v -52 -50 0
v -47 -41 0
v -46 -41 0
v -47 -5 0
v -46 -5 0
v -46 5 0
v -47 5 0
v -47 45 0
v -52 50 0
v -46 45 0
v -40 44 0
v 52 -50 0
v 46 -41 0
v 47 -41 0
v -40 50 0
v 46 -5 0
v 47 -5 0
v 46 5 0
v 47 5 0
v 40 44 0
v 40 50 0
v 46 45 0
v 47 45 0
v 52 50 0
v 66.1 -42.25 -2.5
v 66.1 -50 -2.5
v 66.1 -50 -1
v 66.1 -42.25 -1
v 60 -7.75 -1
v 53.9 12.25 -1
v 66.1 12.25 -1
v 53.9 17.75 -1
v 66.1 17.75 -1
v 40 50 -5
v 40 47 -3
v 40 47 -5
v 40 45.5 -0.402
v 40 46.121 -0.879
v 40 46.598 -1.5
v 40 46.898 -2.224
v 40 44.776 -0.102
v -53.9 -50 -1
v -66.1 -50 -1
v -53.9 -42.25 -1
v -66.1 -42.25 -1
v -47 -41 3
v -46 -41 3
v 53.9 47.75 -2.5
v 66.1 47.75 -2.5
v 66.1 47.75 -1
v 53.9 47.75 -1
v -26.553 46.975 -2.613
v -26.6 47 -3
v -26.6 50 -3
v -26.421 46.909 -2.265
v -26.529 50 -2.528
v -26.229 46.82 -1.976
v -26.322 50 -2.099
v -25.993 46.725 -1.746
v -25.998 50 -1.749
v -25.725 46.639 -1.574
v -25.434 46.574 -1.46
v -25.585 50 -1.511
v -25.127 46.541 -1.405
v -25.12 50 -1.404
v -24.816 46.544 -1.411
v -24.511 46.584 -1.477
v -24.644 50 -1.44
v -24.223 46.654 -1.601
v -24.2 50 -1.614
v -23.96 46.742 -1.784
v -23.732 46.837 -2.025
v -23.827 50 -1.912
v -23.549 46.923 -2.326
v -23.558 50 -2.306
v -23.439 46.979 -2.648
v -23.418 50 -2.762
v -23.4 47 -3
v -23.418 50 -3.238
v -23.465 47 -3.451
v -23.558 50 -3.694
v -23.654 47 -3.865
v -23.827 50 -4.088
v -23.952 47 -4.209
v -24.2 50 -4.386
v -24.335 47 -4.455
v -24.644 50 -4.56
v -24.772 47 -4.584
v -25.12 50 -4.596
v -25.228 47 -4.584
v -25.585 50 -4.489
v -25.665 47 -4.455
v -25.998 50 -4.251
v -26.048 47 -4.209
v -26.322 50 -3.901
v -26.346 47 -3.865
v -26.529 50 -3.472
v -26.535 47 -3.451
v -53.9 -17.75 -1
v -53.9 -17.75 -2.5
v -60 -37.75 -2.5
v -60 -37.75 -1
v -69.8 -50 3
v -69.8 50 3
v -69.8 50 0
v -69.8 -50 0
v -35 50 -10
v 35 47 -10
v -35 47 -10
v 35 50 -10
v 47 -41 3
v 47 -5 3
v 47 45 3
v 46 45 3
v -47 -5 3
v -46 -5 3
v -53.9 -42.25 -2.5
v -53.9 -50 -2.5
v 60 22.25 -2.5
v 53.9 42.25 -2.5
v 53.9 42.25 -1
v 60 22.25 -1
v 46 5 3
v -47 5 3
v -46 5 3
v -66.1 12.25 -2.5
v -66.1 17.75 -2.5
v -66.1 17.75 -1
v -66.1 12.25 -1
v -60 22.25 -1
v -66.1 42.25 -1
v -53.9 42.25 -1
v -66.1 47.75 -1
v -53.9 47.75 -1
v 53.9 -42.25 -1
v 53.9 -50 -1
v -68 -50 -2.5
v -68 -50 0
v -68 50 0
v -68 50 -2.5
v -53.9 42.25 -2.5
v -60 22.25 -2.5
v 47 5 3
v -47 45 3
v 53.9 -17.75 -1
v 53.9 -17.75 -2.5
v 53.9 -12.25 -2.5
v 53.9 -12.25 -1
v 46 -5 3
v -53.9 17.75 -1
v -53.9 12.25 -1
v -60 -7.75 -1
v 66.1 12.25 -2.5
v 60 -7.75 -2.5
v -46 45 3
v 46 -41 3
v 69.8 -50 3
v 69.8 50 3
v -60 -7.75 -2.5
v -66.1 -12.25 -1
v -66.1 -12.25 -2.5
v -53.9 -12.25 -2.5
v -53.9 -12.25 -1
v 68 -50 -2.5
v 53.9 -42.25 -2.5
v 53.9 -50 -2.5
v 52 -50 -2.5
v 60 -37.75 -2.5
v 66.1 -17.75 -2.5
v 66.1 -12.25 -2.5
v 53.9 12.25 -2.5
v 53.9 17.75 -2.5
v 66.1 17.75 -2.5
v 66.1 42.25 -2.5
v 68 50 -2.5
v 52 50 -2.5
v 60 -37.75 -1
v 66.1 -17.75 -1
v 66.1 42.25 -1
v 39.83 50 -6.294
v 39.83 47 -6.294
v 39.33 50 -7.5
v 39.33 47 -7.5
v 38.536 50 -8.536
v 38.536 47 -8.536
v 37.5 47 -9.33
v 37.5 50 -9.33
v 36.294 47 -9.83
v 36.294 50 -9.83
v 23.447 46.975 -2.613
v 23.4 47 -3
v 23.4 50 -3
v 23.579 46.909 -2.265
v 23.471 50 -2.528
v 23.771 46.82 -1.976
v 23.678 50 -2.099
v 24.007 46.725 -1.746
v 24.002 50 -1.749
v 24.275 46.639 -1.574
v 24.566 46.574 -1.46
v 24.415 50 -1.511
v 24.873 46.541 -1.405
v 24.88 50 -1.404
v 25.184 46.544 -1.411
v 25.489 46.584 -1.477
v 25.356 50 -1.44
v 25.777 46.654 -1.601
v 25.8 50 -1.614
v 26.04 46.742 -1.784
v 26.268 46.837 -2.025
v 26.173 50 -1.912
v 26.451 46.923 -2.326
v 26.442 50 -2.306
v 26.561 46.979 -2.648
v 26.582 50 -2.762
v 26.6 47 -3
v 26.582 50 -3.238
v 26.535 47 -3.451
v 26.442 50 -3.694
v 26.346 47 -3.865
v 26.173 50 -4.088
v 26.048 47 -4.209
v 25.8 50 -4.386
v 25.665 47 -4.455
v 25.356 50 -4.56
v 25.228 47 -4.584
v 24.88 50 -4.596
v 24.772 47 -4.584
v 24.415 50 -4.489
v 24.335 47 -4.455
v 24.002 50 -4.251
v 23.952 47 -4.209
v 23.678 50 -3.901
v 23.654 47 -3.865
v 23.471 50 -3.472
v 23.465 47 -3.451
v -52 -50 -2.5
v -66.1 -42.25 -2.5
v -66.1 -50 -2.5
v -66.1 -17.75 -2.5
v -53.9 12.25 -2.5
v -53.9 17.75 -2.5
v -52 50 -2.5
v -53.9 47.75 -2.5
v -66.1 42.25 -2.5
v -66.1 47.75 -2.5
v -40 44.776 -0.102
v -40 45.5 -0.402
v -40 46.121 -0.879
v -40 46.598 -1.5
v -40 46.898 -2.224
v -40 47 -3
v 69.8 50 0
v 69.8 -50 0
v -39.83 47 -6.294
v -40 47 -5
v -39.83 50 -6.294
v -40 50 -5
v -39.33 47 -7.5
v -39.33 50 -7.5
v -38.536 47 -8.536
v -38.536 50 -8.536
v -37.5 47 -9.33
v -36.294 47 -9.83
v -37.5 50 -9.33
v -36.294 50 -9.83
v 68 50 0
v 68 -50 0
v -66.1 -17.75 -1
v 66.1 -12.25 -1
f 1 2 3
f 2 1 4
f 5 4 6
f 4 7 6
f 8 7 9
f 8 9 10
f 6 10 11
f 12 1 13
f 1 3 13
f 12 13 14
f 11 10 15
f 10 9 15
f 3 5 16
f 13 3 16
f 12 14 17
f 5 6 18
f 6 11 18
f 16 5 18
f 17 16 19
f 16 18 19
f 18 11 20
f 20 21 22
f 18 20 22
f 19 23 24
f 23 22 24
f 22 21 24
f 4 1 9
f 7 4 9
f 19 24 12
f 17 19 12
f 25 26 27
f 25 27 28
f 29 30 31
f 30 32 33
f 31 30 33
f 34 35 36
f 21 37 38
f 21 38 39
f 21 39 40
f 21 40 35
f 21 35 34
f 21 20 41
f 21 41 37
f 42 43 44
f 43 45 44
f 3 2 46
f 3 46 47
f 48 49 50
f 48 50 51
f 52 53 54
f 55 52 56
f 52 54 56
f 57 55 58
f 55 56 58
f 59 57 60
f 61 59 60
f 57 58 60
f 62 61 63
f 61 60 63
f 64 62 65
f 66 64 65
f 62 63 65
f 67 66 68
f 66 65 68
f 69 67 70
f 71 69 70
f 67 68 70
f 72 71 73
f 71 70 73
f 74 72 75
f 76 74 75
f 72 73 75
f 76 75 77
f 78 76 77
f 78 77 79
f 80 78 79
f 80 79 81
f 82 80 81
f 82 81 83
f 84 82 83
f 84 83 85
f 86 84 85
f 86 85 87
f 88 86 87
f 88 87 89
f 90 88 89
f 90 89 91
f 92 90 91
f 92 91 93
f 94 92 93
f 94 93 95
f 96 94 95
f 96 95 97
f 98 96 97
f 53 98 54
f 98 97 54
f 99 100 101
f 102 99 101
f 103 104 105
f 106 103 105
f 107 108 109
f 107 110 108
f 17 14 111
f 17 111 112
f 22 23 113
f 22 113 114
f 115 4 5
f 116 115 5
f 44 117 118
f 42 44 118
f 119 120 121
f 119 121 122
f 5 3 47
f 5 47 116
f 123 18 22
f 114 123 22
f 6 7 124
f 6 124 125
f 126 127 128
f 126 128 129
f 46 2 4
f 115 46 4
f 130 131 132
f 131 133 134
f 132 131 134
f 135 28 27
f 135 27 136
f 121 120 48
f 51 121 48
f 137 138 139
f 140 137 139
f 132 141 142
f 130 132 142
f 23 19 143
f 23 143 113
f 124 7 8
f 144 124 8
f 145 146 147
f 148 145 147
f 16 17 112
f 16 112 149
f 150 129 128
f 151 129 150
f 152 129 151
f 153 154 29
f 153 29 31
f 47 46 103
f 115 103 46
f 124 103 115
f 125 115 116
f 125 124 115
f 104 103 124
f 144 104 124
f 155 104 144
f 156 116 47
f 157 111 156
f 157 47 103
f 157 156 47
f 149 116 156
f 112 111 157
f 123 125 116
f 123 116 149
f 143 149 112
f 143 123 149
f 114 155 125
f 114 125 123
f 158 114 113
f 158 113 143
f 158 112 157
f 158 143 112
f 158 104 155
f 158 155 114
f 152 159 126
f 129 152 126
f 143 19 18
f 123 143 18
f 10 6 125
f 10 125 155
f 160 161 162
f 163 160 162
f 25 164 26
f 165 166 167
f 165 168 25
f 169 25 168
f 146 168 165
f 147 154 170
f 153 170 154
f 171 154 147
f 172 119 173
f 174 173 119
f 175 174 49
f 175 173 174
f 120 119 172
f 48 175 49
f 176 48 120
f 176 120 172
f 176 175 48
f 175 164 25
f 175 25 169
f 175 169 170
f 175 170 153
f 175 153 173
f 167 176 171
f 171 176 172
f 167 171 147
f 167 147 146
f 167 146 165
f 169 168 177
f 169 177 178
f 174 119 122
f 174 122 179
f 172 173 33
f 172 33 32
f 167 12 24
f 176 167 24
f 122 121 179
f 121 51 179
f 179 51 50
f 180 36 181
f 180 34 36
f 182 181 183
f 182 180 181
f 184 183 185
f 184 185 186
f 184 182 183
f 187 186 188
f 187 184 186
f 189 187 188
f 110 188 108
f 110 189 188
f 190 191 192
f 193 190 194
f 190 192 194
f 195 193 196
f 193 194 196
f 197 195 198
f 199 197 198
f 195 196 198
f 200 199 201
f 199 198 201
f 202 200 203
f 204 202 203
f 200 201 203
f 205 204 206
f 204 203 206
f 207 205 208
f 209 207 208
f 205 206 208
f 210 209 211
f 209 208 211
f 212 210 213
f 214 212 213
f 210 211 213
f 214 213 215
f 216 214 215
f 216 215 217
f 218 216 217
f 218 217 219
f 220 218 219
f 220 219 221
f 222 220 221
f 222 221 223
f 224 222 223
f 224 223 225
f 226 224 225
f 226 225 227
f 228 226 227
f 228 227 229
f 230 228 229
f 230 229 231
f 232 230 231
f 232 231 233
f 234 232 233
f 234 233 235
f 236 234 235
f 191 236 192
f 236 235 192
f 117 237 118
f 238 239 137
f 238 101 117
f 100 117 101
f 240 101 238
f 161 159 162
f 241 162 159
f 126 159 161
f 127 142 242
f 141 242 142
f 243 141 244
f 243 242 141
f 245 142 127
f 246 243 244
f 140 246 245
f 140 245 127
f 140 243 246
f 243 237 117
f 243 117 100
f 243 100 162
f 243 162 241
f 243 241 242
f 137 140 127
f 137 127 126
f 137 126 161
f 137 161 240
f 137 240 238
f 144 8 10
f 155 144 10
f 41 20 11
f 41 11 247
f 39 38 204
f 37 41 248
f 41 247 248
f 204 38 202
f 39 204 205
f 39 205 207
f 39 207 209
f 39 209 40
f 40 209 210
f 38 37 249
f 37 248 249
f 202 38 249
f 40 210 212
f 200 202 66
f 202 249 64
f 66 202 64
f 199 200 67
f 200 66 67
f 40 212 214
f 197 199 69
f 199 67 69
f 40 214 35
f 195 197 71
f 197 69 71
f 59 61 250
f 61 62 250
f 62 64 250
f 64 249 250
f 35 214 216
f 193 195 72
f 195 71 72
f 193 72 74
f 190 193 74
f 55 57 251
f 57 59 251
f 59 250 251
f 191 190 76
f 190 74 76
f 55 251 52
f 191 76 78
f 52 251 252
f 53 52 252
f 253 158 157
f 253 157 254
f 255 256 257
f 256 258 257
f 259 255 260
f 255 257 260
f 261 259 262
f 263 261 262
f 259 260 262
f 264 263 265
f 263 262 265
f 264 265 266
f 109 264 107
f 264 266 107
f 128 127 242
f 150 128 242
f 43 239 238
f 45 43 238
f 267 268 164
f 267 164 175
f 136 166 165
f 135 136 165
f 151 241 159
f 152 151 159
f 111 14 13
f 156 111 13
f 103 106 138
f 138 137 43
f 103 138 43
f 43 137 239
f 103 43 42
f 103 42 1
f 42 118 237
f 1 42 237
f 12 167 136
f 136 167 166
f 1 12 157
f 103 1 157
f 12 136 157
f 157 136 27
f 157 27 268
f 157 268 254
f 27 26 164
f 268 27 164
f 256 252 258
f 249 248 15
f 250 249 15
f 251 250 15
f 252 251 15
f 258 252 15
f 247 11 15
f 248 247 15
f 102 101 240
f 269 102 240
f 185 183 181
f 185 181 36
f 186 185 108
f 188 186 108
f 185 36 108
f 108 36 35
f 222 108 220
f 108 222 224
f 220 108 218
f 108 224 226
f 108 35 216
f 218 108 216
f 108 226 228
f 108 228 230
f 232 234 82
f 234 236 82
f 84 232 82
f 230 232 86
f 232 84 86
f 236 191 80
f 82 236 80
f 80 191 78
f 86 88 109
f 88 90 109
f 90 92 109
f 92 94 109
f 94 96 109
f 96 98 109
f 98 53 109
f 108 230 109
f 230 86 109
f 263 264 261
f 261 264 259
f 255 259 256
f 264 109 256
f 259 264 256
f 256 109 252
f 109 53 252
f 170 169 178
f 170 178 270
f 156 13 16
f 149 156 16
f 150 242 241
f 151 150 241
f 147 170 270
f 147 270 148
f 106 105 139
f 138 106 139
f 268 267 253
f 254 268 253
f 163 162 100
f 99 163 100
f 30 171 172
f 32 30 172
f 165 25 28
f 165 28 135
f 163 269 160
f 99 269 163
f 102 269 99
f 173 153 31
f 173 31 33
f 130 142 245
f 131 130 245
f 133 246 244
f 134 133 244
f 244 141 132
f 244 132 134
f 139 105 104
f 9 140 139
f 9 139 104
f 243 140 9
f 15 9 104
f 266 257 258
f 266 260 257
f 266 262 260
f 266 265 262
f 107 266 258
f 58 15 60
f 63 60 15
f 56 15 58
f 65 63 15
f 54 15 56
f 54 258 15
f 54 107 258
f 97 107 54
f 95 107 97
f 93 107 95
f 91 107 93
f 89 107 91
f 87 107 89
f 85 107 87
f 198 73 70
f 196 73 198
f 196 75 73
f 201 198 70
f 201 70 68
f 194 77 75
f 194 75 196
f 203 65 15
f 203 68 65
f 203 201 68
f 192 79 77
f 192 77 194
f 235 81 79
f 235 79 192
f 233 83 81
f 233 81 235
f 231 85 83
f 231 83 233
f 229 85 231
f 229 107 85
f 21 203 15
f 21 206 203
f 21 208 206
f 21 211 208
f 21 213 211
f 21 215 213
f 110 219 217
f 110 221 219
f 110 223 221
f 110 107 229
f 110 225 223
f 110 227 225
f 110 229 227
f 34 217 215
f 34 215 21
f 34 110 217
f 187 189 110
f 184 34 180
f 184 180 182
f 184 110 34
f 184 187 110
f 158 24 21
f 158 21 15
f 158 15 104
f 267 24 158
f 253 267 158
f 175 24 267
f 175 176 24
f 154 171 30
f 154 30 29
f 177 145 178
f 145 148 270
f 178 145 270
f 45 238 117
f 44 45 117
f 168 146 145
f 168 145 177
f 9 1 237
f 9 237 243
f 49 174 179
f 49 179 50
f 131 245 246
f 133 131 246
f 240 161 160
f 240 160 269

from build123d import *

# Parameters (mm, degrees)
SKETCH1_W                 = 140
SKETCH1_H                 = 100
BOSS_EXTRUDE1_DEPTH       = 3
SKETCH3_W                 = 16
SKETCH3_H                 = 100
BOSS_EXTRUDE2_DEPTH       = 2.5
SKETCH4_W                 = 12.2
SKETCH4_H                 = 5.5
CUT_EXTRUDE1_DEPTH        = 1.5
LPATTERN1_COUNT           = 4
LPATTERN1_PITCH           = 30
LPATTERN1_COPY_1_SKETCH_W = 12.2
LPATTERN1_COPY_1_SKETCH_H = 5.5
LPATTERN1_COPY_1_DEPTH    = 1.5
LPATTERN1_COPY_2_SKETCH_W = 12.2
LPATTERN1_COPY_2_SKETCH_H = 5.5
LPATTERN1_COPY_2_DEPTH    = 1.5
LPATTERN1_COPY_3_SKETCH_W = 12.2
LPATTERN1_COPY_3_SKETCH_H = 5.5
LPATTERN1_COPY_3_DEPTH    = 1.5
CUT_EXTRUDE3_DEPTH        = 123.102416029
CUT_EXTRUDE3_DEPTH_BACK   = 123.102416029
SKETCH6_W                 = 0.2
SKETCH6_H                 = 3
CUT_EXTRUDE5_DEPTH        = 1.5
LPATTERN2_COUNT           = 2
LPATTERN2_PITCH           = 30
LPATTERN2_COL_COUNT       = 2
LPATTERN2_COL_PITCH       = 30
MIRROR4_COPY_1_DEPTH      = 1.5
MIRROR4_COPY_2_DEPTH      = 1.5
SKETCH13_W                = 1
SKETCH13_H                = 40
SKETCH13_H_2              = 36
CUT_EXTRUDE7_DEPTH        = 10
SKETCH15_W                = 80
SKETCH15_H                = 3
BOSS_EXTRUDE4_DEPTH       = 10
FILLET2_R                 = 5
FILLET3_R                 = 3
SKETCH17_W                = 12.2
SKETCH17_H                = 2.25
CUT_EXTRUDE9_DEPTH        = 1.5
SKETCH18_R                = 1.6
CUT_EXTRUDE10_DEPTH       = 10


with BuildPart() as part:
    # Sketch1 → Boss-Extrude1 (new body)
    with BuildSketch(Plane.XY):
        Rectangle(SKETCH1_W, SKETCH1_H)
    extrude(amount=BOSS_EXTRUDE1_DEPTH)

    # Sketch3 → Boss-Extrude2 (add)
    with BuildSketch(Plane(origin=(0, 0, 0), x_dir=(-1, 0, 0), z_dir=(0, 0, -1))):
        with Locations((-60, 0)):
            Rectangle(SKETCH3_W, SKETCH3_H)
        with Locations((60, 0)):
            Rectangle(SKETCH3_W, SKETCH3_H)
    extrude(amount=BOSS_EXTRUDE2_DEPTH)

    # Sketch4 → Cut-Extrude1 (cut)
    with BuildSketch(Plane(origin=(0, 0, -2.5), x_dir=(-1, 0, 0), z_dir=(0, 0, -1))):
        with Locations((-60, 45)):
            Rectangle(SKETCH4_W, SKETCH4_H)
    cut_extrude1 = extrude(amount=-CUT_EXTRUDE1_DEPTH, mode=Mode.SUBTRACT)

    # Mirror1: Cut-Extrude1 across plane
    add(cut_extrude1.mirror(Plane(origin=(0, 0, 0), x_dir=(0, 0, 1), z_dir=(1, 0, 0))), mode=Mode.SUBTRACT)

    # LPattern1: Cut-Extrude1 ×4
    with Locations(*[(0, -i * LPATTERN1_PITCH, 0) for i in range(1, LPATTERN1_COUNT)]):
        add(cut_extrude1, mode=Mode.SUBTRACT)

    # LPattern1 copy 1 sketch → LPattern1 copy 1 (cut)
    with BuildSketch(Plane(origin=(0, -30, -2.5), x_dir=(1, 0, 0), z_dir=(0, 0, -1))):
        with Locations((-60, -45)):
            Rectangle(LPATTERN1_COPY_1_SKETCH_W, LPATTERN1_COPY_1_SKETCH_H)
    extrude(amount=-LPATTERN1_COPY_1_DEPTH, mode=Mode.SUBTRACT)

    # LPattern1 copy 2 sketch → LPattern1 copy 2 (cut)
    with BuildSketch(Plane(origin=(0, -60, -2.5), x_dir=(1, 0, 0), z_dir=(0, 0, -1))):
        with Locations((-60, -45)):
            Rectangle(LPATTERN1_COPY_2_SKETCH_W, LPATTERN1_COPY_2_SKETCH_H)
    extrude(amount=-LPATTERN1_COPY_2_DEPTH, mode=Mode.SUBTRACT)

    # LPattern1 copy 3 sketch → LPattern1 copy 3 (cut)
    with BuildSketch(Plane(origin=(0, -90, -2.5), x_dir=(1, 0, 0), z_dir=(0, 0, -1))):
        with Locations((-60, -45)):
            Rectangle(LPATTERN1_COPY_3_SKETCH_W, LPATTERN1_COPY_3_SKETCH_H)
    extrude(amount=-LPATTERN1_COPY_3_DEPTH, mode=Mode.SUBTRACT)

    # Sketch6 → Cut-Extrude3 (cut, two sides: drawn at the far end of the back side and taken through both)
    with BuildSketch(Plane(origin=(0, 50, 0), x_dir=(1, 0, 0), z_dir=(0, 1, 0)).offset(-CUT_EXTRUDE3_DEPTH_BACK)):
        with Locations((-69.9, -1.5)):
            Rectangle(SKETCH6_W, SKETCH6_H)
        with Locations((69.9, -1.5)):
            Rectangle(SKETCH6_W, SKETCH6_H)
    extrude(amount=CUT_EXTRUDE3_DEPTH + CUT_EXTRUDE3_DEPTH_BACK, mode=Mode.SUBTRACT)

    # Sketch11 → Cut-Extrude5 (cut)
    with BuildSketch(Plane(origin=(0, 0, -2.5), x_dir=(-1, 0, 0), z_dir=(0, 0, -1))):
        Polygon((-53.9, 12.25), (-60, -7.75), (-66.1, 12.25), align=None)
    cut_extrude5 = extrude(amount=-CUT_EXTRUDE5_DEPTH, mode=Mode.SUBTRACT)

    # LPattern2: Cut-Extrude5 ×2
    with Locations(*[(0, i * LPATTERN2_PITCH, 0) for i in range(1, LPATTERN2_COUNT)]):
        add(cut_extrude5, mode=Mode.SUBTRACT)

    # LPattern2 col: Cut-Extrude5 ×2
    with Locations(*[(0, -i * LPATTERN2_COL_PITCH, 0) for i in range(1, LPATTERN2_COL_COUNT)]):
        add(cut_extrude5, mode=Mode.SUBTRACT)

    # Mirror4: Cut-Extrude5 across plane
    add(cut_extrude5.mirror(Plane(origin=(0, 0, 0), x_dir=(0, 0, 1), z_dir=(1, 0, 0))), mode=Mode.SUBTRACT)

    # Mirror4 copy 1 sketch → Mirror4 copy 1 (cut)
    with BuildSketch(Plane(origin=(0, 30, -2.5), x_dir=(1, 0, 0), z_dir=(0, 0, -1))):
        Polygon((-53.9, -12.25), (-60, 7.75), (-66.1, -12.25), align=None)
    extrude(amount=-MIRROR4_COPY_1_DEPTH, mode=Mode.SUBTRACT)

    # Mirror4 copy 2 sketch → Mirror4 copy 2 (cut)
    with BuildSketch(Plane(origin=(0, -30, -2.5), x_dir=(1, 0, 0), z_dir=(0, 0, -1))):
        Polygon((-53.9, -12.25), (-60, 7.75), (-66.1, -12.25), align=None)
    extrude(amount=-MIRROR4_COPY_2_DEPTH, mode=Mode.SUBTRACT)

    # Sketch13 → Cut-Extrude7 (cut)
    with BuildSketch(Plane(origin=(0, 0, 0), x_dir=(-1, 0, 0), z_dir=(0, 0, -1))):
        with Locations((-46.5, 25)):
            Rectangle(SKETCH13_W, SKETCH13_H)
        with Locations((-46.5, -23)):
            Rectangle(SKETCH13_W, SKETCH13_H_2)
    cut_extrude7 = extrude(amount=-CUT_EXTRUDE7_DEPTH, mode=Mode.SUBTRACT)

    # Mirror7: Cut-Extrude7 across plane
    add(cut_extrude7.mirror(Plane(origin=(0, 0, 0), x_dir=(0, 0, 1), z_dir=(1, 0, 0))), mode=Mode.SUBTRACT)

    # Sketch15 → Boss-Extrude4 (add)
    with BuildSketch(Plane(origin=(0, 0, 0), x_dir=(-1, 0, 0), z_dir=(0, 0, -1))):
        with Locations((0, 48.5)):
            Rectangle(SKETCH15_W, SKETCH15_H)
    extrude(amount=BOSS_EXTRUDE4_DEPTH)

    # Fillet2
    fillet2_edges = [part.edges().sort_by_distance(p)[0] for p in [
        (40, 48.5, -10),
        (-40, 48.5, -10),
    ]]
    fillet(fillet2_edges, radius=FILLET2_R)

    # Fillet3
    fillet3_edges = [part.edges().sort_by_distance(p)[0] for p in [
        (0, 47, 0),
    ]]
    fillet(fillet3_edges, radius=FILLET3_R)

    # Sketch17 → Cut-Extrude9 (cut)
    with BuildSketch(Plane(origin=(0, 0, -2.5), x_dir=(-1, 0, 0), z_dir=(0, 0, -1))):
        with Locations((-60, -48.875)):
            Rectangle(SKETCH17_W, SKETCH17_H)
    cut_extrude9 = extrude(amount=-CUT_EXTRUDE9_DEPTH, mode=Mode.SUBTRACT)

    # Mirror8: Cut-Extrude9 across plane
    add(cut_extrude9.mirror(Plane(origin=(0, 0, 0), x_dir=(0, 0, 1), z_dir=(1, 0, 0))), mode=Mode.SUBTRACT)

    # Sketch18 → Cut-Extrude10 (cut)
    with BuildSketch(Plane(origin=(0, 50, 0), x_dir=(1, 0, 0), z_dir=(0, 1, 0))):
        with Locations(Location((-25, 3, 0), (0, 0, 180))):
            Circle(SKETCH18_R)
        with Locations(Location((25, 3, 0), (0, 0, 180))):
            Circle(SKETCH18_R)
    extrude(amount=-CUT_EXTRUDE10_DEPTH, mode=Mode.SUBTRACT)


solid = part.part
